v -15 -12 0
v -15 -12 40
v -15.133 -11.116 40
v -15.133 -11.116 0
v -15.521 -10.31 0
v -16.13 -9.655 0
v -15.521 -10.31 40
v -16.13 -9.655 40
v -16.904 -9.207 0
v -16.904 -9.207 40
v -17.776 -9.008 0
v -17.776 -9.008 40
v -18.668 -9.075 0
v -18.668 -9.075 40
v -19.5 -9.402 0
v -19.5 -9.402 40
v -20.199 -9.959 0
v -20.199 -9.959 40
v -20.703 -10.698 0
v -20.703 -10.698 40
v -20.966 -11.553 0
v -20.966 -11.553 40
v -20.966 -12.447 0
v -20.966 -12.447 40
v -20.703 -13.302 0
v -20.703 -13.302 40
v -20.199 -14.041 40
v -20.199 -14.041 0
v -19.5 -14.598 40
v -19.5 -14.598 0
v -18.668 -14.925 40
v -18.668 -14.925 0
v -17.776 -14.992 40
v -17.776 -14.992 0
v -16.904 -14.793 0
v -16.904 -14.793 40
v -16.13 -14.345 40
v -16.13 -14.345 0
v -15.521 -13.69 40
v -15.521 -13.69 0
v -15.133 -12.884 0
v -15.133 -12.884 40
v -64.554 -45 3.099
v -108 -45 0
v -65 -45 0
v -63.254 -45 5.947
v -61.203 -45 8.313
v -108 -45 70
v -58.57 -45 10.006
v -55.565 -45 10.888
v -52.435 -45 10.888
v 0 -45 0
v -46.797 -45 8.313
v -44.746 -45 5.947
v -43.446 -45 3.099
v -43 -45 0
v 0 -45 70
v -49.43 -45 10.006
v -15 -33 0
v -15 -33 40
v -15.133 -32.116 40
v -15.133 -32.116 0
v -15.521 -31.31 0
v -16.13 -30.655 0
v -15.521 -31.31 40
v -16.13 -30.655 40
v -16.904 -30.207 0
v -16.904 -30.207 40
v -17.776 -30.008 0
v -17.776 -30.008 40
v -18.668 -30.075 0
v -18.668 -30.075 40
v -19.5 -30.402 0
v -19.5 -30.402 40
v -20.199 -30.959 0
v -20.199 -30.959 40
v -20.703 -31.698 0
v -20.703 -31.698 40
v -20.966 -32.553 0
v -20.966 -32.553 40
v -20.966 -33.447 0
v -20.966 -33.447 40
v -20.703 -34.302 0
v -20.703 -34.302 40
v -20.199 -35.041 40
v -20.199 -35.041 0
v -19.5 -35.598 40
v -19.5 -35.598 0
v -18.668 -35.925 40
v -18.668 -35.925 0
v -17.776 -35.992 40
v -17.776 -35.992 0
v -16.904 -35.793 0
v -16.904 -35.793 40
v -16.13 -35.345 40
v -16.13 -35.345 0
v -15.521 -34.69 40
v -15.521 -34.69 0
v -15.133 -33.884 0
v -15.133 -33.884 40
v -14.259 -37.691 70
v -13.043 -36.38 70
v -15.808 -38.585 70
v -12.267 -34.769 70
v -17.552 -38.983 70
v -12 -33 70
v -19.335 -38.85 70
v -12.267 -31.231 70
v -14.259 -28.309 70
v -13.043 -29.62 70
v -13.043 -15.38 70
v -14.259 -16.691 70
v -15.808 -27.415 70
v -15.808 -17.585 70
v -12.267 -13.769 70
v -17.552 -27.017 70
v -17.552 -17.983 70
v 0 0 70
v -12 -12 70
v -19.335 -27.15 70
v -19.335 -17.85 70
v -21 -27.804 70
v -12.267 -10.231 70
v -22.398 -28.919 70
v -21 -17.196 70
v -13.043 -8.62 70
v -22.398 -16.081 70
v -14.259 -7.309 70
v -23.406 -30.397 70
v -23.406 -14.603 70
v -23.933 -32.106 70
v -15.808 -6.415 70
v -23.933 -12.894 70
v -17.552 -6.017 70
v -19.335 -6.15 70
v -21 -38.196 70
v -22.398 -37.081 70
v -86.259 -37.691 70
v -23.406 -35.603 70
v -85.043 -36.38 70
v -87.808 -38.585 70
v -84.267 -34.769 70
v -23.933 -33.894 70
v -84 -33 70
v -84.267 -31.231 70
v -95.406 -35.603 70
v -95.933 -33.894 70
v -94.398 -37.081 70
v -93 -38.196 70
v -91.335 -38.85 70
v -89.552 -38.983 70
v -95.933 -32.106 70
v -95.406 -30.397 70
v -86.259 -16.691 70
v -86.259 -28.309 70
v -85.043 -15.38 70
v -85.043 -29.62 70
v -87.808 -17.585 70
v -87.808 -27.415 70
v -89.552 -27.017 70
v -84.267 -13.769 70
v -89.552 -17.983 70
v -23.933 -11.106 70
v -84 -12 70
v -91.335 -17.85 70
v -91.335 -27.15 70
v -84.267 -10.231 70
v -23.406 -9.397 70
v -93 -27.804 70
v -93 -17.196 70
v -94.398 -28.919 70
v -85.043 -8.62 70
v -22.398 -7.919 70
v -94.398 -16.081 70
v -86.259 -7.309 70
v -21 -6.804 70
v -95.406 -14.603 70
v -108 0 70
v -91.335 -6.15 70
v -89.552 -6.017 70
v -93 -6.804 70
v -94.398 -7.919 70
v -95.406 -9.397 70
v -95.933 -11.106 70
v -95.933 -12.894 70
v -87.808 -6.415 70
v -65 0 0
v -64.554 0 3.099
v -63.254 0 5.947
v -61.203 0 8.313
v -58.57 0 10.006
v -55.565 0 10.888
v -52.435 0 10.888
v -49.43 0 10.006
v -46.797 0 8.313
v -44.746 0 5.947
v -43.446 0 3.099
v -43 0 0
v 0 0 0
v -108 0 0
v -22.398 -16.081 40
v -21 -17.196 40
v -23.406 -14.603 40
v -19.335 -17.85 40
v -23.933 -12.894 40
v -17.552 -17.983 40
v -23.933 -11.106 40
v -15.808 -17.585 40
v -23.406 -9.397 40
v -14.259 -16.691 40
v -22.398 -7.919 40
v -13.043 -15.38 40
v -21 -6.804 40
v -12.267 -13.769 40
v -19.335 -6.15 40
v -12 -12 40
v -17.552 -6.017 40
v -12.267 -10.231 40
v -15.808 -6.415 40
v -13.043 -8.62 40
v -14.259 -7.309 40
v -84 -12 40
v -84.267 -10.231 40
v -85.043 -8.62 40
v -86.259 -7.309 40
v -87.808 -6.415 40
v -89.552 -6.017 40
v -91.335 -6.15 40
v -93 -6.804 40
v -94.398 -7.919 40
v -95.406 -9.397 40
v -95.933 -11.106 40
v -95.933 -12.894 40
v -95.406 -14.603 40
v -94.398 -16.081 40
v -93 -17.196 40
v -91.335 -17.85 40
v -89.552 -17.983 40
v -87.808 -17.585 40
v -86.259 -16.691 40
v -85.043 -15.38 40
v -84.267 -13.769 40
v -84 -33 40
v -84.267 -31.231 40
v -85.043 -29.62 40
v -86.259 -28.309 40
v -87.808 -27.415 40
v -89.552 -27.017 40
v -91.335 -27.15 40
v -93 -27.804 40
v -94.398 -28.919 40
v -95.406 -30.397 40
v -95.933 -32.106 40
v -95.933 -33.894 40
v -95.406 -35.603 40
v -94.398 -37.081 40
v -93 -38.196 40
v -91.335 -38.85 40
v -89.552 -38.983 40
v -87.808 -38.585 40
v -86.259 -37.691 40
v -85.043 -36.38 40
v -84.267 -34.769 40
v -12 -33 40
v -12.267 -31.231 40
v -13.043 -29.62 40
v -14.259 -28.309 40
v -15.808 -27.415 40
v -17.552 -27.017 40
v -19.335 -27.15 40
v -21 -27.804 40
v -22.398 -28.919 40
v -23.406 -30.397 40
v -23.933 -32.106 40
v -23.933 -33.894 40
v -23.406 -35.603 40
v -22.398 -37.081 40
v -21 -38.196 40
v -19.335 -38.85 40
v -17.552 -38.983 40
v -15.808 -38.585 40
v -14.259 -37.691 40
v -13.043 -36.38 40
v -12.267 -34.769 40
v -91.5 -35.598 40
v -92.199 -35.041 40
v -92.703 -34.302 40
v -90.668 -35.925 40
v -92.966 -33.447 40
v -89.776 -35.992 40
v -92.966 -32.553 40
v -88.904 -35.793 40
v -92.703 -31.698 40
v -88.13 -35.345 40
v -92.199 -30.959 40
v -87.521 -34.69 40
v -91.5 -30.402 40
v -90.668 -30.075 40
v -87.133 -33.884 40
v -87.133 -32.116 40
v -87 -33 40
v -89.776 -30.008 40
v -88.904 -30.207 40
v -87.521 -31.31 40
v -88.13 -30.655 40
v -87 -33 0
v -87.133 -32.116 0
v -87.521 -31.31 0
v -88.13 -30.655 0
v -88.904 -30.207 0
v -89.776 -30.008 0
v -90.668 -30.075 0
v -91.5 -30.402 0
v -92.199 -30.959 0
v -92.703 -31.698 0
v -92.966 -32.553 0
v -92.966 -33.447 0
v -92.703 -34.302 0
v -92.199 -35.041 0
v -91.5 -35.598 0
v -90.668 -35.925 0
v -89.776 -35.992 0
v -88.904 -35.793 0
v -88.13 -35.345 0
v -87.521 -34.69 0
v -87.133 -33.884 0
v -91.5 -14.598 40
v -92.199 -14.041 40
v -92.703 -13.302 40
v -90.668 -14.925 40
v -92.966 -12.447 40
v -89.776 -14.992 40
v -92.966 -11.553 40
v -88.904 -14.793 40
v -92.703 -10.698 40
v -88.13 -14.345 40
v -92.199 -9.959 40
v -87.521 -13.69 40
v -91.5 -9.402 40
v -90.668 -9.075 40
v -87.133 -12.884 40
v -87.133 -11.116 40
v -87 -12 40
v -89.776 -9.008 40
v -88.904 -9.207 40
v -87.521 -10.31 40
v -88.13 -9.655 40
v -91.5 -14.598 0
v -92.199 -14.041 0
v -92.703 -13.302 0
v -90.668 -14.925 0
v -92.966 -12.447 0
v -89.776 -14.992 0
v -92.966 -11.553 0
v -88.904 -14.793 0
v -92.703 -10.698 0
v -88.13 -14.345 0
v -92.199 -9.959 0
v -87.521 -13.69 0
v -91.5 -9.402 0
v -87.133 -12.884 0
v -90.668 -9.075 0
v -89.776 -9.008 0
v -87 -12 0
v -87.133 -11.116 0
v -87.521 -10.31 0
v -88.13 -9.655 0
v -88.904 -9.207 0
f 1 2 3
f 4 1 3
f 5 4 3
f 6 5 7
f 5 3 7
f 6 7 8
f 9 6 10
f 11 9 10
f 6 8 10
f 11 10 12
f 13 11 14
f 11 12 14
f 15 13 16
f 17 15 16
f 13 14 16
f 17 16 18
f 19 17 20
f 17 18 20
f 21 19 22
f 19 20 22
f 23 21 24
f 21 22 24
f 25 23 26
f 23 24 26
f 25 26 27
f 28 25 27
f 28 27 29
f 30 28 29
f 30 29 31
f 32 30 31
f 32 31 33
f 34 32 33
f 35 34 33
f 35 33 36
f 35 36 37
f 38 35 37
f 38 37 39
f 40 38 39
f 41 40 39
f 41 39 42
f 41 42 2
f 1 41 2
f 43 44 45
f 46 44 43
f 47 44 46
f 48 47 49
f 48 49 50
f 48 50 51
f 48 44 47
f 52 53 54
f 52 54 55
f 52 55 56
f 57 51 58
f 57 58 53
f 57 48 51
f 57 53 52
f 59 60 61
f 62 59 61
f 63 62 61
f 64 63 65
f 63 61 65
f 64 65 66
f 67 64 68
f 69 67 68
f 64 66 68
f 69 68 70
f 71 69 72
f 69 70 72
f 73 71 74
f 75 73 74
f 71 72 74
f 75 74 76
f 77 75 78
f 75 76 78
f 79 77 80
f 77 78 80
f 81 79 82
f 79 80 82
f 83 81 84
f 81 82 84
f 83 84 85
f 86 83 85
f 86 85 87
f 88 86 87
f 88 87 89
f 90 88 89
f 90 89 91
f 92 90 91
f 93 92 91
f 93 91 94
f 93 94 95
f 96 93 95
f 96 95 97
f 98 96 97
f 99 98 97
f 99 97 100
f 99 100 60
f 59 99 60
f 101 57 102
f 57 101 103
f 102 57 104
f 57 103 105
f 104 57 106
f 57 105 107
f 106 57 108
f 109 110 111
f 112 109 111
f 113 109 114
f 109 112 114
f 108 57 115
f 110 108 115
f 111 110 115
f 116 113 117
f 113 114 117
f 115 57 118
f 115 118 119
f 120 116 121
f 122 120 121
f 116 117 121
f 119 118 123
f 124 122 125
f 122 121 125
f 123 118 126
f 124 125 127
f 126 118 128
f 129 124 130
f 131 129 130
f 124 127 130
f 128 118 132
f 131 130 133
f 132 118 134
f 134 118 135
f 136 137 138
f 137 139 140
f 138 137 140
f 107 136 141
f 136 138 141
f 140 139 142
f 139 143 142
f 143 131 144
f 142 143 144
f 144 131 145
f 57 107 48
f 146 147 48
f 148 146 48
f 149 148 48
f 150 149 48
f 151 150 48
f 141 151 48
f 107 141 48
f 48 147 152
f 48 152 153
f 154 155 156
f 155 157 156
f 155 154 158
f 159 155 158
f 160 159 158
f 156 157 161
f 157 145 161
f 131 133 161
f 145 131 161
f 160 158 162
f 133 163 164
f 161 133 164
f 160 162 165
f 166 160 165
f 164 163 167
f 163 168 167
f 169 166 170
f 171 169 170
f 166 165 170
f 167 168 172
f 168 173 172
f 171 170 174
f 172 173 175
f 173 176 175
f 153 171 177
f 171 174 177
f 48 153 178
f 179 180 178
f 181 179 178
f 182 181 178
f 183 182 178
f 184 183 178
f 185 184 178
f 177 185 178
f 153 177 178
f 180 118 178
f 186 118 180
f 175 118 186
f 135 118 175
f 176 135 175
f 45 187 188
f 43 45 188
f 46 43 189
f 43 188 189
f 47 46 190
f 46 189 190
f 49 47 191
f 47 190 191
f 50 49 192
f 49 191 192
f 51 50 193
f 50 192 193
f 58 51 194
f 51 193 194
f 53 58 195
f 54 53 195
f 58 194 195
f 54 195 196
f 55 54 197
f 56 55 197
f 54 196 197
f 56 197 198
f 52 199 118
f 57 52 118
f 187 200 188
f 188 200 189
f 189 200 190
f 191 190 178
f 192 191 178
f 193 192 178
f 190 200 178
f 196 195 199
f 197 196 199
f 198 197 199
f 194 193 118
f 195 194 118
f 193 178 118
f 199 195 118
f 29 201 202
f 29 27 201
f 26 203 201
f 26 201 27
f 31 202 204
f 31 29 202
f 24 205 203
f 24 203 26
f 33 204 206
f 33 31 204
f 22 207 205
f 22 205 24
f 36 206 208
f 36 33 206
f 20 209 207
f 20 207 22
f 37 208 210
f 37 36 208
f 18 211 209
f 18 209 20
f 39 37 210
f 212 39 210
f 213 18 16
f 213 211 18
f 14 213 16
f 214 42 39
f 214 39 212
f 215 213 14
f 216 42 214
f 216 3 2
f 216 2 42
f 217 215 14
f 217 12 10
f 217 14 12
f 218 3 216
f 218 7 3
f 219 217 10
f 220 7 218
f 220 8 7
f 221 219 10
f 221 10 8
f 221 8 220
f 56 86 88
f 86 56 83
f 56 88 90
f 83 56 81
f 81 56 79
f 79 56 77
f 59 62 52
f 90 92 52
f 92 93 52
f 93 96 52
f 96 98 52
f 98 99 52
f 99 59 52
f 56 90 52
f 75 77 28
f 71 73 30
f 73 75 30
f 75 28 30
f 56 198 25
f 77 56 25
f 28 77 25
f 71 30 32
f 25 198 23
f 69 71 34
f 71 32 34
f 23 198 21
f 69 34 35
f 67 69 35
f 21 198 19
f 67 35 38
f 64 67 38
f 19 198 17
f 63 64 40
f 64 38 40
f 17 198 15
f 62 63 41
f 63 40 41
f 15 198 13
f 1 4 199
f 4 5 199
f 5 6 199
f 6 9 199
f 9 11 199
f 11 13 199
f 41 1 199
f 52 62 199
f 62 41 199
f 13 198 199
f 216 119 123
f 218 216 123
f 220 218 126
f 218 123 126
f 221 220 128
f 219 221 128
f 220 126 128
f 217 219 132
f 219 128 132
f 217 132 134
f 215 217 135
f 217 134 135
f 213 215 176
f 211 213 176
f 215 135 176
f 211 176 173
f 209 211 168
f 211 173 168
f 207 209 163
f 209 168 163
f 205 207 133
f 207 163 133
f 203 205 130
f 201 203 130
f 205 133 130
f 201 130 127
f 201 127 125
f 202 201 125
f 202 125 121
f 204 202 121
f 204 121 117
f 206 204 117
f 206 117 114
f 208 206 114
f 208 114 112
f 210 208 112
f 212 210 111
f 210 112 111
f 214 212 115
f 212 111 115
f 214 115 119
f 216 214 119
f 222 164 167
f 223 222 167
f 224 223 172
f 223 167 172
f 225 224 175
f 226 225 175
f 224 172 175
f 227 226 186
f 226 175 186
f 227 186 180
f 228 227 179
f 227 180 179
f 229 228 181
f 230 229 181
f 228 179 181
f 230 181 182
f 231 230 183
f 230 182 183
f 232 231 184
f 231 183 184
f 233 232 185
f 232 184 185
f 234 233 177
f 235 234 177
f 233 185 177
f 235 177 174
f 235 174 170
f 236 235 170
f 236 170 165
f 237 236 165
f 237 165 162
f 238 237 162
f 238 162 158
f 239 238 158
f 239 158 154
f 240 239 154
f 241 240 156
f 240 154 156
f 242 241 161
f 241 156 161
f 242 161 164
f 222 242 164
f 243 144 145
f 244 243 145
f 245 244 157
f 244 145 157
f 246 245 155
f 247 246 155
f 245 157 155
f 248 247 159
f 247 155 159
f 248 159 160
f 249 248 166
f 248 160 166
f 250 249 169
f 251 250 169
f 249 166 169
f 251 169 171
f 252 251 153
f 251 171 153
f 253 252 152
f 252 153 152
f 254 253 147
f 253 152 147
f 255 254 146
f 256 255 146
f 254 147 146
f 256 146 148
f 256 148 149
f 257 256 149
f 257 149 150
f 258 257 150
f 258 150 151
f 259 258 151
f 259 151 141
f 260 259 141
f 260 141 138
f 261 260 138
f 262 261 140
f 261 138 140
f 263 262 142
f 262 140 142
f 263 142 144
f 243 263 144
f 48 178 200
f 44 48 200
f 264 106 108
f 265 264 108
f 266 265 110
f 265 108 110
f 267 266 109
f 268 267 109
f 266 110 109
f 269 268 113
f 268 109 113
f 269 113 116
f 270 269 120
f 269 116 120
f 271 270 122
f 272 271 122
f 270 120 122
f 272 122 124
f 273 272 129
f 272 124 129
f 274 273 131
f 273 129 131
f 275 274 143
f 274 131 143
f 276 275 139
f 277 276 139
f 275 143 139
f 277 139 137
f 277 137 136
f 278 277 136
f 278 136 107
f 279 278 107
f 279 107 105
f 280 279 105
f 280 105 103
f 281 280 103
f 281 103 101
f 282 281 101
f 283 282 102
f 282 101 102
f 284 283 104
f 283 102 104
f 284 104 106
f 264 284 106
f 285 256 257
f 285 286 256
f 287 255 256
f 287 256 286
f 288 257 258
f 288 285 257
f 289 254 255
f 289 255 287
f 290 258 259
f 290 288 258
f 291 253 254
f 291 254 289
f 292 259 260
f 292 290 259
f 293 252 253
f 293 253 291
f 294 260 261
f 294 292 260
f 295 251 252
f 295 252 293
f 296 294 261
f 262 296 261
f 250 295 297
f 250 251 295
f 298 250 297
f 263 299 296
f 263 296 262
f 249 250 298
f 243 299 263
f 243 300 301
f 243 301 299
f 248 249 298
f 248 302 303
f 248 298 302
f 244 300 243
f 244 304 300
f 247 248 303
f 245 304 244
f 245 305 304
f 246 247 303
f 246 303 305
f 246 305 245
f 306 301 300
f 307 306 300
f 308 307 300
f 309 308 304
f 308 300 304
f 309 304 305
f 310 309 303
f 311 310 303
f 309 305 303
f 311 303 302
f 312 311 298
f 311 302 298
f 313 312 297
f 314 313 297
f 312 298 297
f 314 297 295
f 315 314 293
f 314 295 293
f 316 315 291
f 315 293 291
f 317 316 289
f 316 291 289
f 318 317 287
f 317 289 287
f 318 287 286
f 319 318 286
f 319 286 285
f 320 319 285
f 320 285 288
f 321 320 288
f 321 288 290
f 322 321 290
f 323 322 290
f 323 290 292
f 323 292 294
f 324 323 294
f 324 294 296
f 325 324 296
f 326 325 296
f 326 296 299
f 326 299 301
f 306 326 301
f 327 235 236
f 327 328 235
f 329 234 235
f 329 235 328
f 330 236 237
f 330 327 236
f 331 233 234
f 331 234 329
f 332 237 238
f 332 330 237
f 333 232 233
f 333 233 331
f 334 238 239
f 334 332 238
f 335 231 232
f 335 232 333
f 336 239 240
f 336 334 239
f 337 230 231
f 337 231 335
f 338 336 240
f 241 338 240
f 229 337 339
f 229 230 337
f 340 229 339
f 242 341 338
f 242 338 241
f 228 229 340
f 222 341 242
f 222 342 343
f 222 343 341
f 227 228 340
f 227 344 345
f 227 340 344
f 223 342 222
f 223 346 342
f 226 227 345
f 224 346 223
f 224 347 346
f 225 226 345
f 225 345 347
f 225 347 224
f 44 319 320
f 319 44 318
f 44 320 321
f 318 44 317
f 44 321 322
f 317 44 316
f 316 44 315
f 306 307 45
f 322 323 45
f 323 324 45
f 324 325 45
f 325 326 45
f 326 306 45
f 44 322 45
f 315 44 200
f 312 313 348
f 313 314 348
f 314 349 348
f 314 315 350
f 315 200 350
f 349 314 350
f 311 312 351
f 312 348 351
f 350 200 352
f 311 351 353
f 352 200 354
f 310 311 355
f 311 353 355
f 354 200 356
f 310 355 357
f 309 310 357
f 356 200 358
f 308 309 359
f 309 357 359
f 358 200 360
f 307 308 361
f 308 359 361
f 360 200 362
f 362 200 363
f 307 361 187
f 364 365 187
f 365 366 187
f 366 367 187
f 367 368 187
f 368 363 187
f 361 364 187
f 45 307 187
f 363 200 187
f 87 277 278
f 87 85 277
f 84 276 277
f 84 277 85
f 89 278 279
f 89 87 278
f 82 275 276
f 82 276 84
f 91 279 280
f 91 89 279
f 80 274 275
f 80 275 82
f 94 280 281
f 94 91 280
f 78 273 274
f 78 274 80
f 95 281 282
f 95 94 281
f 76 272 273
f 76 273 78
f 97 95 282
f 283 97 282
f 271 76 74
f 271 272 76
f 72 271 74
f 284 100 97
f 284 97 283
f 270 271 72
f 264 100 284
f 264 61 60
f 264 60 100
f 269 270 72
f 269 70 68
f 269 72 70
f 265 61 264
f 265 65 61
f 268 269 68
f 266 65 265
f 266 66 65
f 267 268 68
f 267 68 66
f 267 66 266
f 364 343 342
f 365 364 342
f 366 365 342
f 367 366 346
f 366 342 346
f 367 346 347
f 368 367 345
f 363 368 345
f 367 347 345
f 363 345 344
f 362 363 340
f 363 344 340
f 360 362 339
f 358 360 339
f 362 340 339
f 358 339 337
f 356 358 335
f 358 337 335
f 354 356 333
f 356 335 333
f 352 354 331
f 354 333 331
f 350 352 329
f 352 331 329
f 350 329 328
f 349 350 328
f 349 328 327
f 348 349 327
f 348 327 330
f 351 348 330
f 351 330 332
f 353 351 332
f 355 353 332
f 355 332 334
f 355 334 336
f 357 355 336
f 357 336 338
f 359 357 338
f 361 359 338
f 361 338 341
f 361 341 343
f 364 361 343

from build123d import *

# Parameters (mm, degrees)
F1_DEPTH = 45
F2_R     = 6
F3_DEPTH = 30
F4_R     = 3
F5_DEPTH = 40.001


with BuildPart() as f1:
    # F0 (on Front) → F1 (new body)
    with BuildSketch(Plane.XZ):
        with BuildLine():
            Line((-43, 0), (0, 0))
            Line((0, 0), (0, 70))
            Line((0, 70), (-108, 70))
            Line((-108, 70), (-108, 0))
            Line((-108, 0), (-65, 0))
            ThreePointArc((-65, 0), (-54, 11), (-43, 0))
        make_face()
    extrude(amount=F1_DEPTH)

    # F2 (on face) → F3 (cut)
    with BuildSketch(Plane.XY.offset(70)):
        with Locations((-90, -12)):
            Circle(F2_R)
        with Locations((-90, -33)):
            Circle(F2_R)
        with Locations((-18, -12)):
            Circle(F2_R)
        with Locations((-18, -33)):
            Circle(F2_R)
    extrude(amount=-F3_DEPTH, mode=Mode.SUBTRACT)

    # F4 (on face) → F5 (cut, through all)
    with BuildSketch(Plane.XY.offset(40)):
        with Locations((-90, -12)):
            Circle(F4_R)
        with Locations((-18, -12)):
            Circle(F4_R)
        with Locations((-18, -33)):
            Circle(F4_R)
        with Locations((-90, -33)):
            Circle(F4_R)
    extrude(amount=-F5_DEPTH, mode=Mode.SUBTRACT)


solid = f1.part
